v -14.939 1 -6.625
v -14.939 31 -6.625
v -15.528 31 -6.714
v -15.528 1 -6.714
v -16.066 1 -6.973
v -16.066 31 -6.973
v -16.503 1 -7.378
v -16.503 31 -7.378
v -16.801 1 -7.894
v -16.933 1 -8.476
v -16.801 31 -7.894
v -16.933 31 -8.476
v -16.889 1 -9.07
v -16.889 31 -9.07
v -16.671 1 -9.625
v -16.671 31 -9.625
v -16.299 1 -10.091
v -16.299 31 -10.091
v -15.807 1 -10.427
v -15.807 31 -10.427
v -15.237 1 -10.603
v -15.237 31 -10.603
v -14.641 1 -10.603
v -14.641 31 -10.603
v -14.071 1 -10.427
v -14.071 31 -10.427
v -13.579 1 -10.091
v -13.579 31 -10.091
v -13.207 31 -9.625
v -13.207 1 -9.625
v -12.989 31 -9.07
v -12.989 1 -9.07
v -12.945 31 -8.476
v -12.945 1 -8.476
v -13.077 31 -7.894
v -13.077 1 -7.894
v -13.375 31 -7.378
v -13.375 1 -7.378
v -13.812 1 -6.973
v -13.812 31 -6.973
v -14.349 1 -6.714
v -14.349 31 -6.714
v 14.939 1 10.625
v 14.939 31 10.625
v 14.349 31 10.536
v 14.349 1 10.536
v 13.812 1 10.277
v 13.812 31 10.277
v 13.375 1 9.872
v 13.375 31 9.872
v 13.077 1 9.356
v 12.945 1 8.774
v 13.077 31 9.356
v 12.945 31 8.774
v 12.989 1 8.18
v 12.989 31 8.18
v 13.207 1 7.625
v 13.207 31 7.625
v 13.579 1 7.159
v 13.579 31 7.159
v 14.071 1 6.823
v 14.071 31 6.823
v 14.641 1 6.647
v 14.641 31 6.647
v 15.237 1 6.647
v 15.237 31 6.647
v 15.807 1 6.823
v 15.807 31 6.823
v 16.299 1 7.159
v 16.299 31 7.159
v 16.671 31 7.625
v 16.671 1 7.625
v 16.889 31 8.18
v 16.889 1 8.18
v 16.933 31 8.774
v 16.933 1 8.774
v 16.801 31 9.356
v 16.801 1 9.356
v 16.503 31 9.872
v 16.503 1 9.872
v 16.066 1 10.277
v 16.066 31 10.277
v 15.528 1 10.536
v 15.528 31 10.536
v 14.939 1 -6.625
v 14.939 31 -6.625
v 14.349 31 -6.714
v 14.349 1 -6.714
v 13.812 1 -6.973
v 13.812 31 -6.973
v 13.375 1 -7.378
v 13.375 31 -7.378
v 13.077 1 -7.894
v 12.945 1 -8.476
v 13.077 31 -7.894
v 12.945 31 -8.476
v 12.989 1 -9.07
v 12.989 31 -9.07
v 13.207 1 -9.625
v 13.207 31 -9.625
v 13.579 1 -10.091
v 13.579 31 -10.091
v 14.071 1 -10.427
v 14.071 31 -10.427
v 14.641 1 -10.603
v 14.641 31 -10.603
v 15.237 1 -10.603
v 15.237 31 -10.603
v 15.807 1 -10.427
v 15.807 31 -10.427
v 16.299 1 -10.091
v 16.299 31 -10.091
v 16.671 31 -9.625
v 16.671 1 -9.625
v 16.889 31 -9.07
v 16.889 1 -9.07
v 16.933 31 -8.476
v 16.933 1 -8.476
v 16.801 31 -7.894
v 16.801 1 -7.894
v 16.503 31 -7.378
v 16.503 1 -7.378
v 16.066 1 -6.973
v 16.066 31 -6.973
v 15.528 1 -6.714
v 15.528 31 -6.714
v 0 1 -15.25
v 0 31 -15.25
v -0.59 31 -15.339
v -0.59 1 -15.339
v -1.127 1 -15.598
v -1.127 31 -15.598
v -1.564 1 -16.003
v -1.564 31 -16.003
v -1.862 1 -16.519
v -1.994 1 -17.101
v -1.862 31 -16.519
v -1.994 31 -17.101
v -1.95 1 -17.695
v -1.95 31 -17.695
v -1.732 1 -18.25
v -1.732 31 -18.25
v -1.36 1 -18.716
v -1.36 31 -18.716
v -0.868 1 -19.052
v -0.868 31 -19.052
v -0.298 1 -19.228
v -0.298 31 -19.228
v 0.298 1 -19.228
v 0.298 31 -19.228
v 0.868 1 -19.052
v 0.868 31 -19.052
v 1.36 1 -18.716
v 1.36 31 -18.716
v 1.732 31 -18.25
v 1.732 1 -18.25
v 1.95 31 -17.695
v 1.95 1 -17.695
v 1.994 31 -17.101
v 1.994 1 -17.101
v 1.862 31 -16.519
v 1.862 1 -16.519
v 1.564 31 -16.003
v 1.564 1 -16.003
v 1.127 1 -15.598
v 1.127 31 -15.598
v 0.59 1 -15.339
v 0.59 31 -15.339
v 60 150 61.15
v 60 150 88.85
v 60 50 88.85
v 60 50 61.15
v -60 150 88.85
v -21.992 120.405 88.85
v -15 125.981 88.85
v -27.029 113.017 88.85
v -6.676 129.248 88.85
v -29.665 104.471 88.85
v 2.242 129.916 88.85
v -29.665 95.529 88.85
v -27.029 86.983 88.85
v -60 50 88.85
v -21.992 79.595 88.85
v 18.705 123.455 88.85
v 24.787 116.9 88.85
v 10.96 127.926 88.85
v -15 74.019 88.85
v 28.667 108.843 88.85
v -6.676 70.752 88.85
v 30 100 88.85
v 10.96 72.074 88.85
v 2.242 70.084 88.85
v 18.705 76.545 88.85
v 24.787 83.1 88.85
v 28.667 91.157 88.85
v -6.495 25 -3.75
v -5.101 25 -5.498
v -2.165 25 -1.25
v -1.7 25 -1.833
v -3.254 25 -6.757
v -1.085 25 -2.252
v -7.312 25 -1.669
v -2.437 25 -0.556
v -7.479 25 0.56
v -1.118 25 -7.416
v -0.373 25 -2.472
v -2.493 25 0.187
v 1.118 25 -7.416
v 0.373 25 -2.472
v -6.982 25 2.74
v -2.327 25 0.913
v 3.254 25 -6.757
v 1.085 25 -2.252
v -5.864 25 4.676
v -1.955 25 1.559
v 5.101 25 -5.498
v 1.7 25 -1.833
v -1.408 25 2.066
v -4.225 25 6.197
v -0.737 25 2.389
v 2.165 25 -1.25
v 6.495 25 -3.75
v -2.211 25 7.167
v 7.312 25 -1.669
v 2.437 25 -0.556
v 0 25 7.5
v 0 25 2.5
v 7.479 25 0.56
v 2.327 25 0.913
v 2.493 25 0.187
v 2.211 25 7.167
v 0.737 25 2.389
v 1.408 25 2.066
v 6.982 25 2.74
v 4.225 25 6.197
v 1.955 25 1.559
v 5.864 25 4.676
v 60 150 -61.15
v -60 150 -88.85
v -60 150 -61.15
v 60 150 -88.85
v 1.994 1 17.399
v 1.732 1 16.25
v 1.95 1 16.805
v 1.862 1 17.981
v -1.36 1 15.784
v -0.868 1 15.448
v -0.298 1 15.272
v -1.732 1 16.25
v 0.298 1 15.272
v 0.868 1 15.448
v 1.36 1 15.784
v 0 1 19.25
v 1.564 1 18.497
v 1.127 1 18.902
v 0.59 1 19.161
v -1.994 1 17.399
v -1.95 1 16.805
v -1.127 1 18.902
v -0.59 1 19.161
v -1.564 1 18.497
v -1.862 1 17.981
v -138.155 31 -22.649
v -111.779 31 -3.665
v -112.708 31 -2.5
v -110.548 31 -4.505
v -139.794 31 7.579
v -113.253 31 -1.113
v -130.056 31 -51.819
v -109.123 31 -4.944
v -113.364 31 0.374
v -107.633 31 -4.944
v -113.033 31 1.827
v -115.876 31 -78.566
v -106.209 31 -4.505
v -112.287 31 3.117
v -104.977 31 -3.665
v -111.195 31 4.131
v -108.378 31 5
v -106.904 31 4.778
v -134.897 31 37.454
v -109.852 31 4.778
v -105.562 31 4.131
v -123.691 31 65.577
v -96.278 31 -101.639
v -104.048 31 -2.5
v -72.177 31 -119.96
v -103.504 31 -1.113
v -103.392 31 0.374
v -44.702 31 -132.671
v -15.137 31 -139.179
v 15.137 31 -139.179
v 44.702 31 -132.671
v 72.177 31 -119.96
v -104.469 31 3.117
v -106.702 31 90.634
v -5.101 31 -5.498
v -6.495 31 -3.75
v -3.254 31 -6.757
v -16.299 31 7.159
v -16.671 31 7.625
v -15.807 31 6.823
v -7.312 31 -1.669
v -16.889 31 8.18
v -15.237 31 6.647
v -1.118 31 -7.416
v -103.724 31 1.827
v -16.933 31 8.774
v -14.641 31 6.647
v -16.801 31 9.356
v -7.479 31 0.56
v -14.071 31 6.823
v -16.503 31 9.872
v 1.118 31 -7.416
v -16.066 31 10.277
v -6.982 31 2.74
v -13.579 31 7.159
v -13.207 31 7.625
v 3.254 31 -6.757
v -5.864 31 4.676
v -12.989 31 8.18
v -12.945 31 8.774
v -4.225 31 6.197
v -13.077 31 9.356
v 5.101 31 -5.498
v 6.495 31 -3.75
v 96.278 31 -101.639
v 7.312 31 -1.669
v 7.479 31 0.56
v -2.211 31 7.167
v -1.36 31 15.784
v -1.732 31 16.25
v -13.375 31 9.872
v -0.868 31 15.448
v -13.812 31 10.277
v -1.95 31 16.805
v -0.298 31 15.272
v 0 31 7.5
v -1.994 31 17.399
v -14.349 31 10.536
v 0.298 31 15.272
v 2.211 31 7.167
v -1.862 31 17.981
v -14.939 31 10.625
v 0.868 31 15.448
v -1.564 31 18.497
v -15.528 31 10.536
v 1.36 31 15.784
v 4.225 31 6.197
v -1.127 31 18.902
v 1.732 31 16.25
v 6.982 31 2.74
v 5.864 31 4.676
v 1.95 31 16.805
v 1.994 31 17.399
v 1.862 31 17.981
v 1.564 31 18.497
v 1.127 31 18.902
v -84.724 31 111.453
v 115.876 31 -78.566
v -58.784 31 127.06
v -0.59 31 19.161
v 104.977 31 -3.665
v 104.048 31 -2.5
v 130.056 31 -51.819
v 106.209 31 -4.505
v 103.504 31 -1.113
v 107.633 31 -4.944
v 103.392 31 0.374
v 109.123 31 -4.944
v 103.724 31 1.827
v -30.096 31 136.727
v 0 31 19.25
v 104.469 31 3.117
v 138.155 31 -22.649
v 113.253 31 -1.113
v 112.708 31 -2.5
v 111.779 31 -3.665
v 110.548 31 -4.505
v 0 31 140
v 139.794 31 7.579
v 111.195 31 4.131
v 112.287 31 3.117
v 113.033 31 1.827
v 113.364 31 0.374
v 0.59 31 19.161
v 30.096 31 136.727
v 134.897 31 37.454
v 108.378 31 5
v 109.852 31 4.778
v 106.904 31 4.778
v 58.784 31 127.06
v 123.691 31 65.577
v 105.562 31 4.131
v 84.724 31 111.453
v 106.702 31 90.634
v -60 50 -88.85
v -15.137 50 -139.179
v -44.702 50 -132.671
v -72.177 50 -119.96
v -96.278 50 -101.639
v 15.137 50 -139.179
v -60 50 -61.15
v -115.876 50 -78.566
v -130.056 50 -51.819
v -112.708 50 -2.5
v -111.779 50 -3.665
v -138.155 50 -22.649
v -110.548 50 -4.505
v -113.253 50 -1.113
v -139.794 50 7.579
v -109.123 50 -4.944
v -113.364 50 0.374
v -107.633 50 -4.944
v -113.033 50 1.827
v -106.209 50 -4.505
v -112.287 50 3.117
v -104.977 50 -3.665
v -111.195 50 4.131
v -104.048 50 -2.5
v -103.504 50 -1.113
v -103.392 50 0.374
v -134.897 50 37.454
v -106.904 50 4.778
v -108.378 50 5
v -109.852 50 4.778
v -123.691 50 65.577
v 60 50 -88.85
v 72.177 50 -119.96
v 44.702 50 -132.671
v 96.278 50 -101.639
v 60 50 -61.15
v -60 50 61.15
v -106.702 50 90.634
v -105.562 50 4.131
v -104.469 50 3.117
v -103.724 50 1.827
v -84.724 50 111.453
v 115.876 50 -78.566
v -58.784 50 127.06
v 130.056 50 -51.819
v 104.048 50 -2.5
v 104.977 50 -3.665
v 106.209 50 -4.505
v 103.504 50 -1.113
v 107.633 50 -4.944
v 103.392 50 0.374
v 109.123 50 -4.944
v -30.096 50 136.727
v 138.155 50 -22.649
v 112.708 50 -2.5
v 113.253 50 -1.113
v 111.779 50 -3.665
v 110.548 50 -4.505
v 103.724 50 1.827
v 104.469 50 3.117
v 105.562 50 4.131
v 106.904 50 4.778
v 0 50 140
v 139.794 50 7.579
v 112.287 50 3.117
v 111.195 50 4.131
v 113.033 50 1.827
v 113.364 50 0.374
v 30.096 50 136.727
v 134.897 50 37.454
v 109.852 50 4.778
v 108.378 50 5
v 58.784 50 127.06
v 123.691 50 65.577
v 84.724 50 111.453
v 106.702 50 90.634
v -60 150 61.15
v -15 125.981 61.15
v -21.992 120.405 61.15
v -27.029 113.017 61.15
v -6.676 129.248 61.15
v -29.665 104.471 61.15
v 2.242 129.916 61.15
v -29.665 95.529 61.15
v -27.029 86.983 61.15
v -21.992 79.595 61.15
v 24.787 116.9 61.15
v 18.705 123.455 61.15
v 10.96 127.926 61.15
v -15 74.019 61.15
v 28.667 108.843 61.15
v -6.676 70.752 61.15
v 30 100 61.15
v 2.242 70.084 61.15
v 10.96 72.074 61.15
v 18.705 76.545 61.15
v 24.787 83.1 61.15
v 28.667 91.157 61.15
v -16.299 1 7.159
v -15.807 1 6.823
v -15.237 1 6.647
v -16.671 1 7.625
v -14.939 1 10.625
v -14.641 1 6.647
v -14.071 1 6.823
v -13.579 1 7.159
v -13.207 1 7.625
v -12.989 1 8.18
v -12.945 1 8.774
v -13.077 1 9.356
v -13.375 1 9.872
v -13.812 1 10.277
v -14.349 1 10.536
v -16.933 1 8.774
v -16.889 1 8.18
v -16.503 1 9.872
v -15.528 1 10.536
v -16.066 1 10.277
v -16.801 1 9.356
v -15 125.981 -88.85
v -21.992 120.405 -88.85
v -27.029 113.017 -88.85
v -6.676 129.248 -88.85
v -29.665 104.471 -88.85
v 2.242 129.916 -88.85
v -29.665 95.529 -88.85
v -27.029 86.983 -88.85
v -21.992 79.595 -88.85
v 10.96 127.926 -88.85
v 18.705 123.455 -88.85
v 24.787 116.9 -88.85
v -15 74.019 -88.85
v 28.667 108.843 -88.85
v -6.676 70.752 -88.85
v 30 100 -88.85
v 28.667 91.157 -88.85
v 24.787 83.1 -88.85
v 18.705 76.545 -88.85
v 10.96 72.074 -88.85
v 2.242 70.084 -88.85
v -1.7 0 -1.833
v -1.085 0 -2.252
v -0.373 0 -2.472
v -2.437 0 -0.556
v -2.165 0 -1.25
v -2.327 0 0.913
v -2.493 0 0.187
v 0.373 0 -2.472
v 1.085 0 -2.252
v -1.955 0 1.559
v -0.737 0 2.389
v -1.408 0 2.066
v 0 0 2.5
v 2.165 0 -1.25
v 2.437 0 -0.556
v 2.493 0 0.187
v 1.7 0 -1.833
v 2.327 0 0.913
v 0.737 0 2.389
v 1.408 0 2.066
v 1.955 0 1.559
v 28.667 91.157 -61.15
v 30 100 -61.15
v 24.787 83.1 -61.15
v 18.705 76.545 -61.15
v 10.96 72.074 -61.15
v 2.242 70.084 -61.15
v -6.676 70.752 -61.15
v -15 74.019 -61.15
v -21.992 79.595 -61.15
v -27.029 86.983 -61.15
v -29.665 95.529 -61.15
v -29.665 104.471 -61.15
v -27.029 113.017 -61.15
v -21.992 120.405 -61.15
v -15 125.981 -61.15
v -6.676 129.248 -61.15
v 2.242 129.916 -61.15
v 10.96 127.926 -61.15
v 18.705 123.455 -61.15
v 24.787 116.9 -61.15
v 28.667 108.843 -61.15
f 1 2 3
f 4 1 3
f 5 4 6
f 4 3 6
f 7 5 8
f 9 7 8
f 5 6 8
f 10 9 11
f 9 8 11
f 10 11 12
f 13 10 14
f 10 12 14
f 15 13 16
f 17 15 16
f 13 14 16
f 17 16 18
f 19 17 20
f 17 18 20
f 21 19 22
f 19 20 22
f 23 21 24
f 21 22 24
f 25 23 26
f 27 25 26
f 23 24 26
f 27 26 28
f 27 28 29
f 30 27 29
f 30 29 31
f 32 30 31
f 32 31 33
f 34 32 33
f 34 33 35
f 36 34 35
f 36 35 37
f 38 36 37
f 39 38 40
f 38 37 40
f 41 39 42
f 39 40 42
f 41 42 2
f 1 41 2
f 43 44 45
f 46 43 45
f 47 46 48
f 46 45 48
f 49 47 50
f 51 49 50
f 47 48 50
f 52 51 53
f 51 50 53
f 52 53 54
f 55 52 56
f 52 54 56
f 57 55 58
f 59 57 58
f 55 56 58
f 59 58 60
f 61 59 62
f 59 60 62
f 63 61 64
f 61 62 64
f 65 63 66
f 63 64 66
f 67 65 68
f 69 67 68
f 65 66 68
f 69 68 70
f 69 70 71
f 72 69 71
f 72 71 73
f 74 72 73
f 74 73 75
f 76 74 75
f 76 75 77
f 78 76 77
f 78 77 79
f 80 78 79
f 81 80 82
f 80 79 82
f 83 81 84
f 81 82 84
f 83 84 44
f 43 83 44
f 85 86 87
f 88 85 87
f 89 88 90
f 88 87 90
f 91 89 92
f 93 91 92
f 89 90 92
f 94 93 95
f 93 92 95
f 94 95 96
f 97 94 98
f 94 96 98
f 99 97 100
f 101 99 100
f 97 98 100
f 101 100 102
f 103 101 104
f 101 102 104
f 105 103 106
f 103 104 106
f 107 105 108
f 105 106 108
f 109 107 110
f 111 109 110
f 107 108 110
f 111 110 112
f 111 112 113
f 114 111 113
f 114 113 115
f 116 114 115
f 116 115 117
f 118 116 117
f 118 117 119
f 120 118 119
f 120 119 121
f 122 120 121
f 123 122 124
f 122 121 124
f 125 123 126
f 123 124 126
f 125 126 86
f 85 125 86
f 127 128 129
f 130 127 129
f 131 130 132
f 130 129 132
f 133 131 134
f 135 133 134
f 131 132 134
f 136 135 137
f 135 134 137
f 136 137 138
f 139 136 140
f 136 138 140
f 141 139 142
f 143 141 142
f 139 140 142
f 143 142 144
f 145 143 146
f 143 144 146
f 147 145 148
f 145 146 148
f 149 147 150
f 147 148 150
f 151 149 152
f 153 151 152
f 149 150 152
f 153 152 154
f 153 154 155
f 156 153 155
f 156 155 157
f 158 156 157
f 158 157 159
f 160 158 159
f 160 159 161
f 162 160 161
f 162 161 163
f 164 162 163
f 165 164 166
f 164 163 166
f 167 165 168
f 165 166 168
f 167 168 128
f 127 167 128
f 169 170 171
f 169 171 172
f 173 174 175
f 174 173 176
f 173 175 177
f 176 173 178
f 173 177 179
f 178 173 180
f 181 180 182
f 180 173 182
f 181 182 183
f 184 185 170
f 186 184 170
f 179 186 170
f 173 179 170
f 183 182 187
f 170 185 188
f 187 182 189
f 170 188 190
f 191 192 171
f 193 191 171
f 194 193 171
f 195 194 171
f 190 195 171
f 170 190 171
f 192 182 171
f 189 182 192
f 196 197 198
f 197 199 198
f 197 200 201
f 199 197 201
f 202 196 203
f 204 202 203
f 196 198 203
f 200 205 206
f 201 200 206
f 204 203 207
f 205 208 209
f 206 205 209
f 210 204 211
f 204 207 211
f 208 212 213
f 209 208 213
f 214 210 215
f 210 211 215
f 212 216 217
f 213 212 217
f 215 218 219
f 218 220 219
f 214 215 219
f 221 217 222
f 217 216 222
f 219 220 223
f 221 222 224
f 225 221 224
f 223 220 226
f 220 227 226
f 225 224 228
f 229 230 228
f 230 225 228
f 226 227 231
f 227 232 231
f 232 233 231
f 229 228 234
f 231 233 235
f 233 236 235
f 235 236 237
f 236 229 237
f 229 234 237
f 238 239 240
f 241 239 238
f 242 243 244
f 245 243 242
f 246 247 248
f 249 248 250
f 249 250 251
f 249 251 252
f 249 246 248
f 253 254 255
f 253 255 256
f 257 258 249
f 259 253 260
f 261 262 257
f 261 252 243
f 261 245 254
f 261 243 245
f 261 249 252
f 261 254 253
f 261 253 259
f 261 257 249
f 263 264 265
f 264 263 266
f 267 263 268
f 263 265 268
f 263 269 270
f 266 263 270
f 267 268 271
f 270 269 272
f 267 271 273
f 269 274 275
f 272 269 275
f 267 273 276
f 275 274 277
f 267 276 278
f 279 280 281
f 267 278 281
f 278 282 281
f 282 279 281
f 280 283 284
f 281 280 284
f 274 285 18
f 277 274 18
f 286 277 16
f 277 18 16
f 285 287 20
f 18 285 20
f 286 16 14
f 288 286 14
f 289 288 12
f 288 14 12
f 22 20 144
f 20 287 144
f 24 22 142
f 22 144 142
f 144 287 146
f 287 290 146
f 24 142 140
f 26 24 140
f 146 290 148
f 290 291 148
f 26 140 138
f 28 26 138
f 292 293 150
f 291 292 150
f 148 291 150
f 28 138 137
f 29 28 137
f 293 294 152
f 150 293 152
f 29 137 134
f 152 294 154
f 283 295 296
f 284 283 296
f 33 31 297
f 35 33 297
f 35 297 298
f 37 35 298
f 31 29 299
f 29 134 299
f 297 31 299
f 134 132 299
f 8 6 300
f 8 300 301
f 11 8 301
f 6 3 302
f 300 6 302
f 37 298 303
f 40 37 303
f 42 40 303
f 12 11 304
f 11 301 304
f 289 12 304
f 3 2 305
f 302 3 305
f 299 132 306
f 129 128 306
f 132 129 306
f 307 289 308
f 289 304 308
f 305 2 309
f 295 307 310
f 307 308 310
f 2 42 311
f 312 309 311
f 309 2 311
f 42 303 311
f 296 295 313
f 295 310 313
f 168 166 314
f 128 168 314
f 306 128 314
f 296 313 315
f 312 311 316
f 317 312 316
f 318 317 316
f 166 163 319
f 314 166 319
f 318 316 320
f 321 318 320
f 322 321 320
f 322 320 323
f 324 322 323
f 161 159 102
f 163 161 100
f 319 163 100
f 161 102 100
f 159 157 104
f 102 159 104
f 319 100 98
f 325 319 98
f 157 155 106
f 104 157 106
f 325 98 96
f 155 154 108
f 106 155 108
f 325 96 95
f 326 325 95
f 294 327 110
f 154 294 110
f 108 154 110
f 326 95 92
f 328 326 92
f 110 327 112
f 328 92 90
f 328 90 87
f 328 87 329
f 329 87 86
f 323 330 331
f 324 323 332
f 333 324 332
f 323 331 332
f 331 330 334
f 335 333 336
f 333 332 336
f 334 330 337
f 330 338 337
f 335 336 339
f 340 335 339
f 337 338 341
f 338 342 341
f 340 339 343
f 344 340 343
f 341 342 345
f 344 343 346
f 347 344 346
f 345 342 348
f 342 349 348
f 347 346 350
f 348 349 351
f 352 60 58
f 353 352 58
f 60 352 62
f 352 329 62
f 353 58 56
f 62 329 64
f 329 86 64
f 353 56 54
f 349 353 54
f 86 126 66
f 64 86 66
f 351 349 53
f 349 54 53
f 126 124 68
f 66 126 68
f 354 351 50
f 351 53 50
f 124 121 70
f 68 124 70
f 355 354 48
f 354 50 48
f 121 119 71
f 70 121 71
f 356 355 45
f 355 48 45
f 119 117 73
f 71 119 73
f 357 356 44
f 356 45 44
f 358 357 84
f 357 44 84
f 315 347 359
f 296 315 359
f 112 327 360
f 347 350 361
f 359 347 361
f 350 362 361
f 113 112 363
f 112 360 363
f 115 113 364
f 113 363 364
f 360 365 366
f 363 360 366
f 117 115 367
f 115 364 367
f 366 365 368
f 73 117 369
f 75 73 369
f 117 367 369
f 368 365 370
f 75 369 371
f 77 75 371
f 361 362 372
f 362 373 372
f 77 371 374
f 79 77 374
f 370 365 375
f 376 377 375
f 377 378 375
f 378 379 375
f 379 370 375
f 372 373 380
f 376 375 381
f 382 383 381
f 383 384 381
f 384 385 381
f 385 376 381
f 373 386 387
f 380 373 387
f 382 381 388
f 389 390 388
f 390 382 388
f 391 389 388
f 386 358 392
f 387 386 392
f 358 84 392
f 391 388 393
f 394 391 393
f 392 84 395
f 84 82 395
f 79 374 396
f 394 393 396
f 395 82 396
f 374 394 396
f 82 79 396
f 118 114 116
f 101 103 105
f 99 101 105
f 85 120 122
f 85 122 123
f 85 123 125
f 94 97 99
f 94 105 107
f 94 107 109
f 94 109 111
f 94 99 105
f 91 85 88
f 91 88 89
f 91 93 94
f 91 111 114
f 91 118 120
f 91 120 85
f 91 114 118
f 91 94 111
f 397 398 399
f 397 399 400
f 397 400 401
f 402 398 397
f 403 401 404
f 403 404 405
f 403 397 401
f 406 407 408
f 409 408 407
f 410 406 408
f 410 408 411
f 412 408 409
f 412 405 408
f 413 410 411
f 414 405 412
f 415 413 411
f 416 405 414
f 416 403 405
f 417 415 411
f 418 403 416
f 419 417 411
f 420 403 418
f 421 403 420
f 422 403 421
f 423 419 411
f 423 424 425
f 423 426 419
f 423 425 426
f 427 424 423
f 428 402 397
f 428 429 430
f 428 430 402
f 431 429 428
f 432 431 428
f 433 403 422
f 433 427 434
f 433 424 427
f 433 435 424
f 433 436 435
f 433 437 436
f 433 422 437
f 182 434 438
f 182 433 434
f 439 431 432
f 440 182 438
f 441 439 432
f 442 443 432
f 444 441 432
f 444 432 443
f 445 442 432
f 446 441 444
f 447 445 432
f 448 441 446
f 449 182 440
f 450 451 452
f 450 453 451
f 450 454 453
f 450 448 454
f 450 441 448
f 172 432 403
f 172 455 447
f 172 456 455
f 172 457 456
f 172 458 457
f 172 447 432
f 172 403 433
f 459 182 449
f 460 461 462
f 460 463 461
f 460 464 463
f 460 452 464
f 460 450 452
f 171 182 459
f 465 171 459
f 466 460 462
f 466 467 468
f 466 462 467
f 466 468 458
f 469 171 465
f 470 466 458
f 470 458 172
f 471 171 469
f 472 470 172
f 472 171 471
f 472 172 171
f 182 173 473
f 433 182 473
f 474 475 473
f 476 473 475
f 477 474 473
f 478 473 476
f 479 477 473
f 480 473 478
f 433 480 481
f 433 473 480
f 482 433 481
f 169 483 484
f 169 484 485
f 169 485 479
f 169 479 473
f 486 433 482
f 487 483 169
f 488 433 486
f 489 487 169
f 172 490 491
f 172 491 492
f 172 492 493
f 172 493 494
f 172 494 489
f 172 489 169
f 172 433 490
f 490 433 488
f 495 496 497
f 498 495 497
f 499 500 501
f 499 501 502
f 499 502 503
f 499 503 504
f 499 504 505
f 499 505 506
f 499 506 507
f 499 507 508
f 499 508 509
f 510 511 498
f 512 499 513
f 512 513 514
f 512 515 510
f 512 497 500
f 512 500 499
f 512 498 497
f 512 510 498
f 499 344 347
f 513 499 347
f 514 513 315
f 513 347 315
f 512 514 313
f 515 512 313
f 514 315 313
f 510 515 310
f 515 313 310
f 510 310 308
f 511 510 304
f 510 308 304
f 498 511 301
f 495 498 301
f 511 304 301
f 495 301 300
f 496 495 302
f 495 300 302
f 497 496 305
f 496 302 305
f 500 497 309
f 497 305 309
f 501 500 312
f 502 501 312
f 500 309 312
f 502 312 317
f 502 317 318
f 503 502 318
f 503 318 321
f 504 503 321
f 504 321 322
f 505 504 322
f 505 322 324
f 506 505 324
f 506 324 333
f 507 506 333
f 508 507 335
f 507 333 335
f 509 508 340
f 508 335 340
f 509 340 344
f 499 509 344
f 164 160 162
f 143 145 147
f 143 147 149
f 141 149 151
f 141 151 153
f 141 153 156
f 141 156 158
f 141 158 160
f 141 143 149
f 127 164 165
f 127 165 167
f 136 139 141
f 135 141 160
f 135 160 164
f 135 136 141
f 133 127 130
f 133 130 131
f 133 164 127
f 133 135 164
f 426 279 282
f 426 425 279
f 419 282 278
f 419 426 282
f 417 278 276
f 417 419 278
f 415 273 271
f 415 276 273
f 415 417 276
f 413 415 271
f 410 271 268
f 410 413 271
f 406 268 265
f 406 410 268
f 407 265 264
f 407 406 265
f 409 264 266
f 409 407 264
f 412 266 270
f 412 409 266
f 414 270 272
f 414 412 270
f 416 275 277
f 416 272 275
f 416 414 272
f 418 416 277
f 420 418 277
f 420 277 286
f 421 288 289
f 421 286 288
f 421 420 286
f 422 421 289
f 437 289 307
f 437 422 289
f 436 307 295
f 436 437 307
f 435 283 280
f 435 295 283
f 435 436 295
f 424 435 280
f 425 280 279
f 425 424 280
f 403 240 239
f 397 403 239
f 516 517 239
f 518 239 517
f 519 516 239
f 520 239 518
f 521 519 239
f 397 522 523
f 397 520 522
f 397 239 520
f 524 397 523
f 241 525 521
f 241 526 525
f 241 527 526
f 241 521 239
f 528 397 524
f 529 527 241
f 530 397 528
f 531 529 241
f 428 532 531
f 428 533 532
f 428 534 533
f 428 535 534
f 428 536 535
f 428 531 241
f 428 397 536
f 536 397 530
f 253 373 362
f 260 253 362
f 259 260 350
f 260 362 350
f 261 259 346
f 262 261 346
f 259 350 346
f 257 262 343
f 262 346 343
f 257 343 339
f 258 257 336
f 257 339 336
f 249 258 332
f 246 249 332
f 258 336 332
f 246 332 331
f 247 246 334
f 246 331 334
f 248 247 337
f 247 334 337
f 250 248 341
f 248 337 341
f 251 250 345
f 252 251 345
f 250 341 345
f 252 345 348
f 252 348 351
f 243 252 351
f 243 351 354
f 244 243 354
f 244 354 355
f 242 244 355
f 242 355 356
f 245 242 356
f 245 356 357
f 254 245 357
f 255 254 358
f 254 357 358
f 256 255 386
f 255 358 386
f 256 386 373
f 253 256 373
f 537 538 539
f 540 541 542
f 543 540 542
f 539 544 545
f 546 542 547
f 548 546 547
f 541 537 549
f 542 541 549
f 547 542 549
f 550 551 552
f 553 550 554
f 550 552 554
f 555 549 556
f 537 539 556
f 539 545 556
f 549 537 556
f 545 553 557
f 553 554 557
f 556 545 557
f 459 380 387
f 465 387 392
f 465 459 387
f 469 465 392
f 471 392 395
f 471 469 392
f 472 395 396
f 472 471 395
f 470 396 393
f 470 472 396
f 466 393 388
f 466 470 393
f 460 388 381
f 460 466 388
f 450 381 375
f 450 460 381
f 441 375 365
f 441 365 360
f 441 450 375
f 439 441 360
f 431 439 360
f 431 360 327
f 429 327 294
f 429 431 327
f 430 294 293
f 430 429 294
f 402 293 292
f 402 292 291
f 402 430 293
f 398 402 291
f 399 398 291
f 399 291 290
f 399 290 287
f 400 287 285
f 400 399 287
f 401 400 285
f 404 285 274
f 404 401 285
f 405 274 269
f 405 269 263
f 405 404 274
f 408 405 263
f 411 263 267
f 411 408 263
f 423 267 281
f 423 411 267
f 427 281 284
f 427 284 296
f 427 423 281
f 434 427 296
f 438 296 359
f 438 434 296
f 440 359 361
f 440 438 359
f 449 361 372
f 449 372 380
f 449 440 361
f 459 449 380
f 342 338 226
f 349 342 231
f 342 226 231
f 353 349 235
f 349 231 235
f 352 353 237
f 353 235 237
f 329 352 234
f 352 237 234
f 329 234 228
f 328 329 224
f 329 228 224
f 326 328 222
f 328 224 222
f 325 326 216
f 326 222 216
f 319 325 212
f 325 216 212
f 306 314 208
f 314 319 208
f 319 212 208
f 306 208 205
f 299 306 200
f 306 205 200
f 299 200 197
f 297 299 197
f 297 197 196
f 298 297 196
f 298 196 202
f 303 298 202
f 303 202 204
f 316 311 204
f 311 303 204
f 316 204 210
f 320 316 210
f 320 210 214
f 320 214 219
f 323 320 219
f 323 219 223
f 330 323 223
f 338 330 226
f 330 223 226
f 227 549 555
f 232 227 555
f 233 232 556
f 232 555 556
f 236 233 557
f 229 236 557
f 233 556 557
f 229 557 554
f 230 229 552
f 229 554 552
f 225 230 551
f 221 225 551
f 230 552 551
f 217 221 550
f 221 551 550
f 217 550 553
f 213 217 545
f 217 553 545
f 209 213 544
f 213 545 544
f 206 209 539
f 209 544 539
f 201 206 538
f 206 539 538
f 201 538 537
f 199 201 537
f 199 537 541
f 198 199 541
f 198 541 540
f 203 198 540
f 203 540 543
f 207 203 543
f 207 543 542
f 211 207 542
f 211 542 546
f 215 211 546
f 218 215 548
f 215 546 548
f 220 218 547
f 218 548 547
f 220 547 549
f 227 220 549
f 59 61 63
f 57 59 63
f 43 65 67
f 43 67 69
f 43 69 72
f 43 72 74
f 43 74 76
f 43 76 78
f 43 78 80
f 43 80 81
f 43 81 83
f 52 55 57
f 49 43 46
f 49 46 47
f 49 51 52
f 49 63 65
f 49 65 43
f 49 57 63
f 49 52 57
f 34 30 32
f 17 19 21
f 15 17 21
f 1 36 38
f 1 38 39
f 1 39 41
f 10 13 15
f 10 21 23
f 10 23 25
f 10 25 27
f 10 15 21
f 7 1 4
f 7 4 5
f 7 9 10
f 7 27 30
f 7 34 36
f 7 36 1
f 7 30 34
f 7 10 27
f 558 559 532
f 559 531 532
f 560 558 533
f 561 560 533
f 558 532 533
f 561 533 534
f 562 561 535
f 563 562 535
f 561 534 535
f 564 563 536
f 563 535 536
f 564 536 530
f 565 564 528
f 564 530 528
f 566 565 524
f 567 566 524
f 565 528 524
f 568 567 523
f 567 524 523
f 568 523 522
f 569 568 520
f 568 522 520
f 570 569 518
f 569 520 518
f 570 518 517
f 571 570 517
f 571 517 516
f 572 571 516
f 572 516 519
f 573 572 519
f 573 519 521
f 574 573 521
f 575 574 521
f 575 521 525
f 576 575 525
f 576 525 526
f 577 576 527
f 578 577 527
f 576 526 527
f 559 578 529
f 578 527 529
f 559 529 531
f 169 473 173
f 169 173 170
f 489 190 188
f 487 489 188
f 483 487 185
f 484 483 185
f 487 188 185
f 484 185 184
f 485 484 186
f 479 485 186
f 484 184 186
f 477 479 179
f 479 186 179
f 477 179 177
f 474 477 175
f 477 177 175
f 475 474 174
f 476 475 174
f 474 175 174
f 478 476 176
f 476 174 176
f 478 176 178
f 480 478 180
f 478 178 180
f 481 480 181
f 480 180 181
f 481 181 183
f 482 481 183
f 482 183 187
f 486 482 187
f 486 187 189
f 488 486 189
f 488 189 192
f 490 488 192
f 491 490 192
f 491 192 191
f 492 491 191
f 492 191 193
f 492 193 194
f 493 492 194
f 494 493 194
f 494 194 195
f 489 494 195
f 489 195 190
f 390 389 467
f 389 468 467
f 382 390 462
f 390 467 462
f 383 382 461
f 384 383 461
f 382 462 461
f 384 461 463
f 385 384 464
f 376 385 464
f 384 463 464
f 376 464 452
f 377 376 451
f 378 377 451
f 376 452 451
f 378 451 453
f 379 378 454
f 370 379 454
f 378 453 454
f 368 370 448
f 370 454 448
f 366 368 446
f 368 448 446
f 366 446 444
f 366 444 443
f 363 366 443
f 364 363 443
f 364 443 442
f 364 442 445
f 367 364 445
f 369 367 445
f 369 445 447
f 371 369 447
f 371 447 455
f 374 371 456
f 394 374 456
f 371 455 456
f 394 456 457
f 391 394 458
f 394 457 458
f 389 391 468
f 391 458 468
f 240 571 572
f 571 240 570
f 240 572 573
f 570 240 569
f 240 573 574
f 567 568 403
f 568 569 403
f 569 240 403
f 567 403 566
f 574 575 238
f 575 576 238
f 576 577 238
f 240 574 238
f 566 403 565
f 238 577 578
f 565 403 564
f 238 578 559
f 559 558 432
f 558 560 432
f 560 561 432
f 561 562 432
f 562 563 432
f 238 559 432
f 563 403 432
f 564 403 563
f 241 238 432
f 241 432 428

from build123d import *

# Parameters (mm, degrees)
SKETCH_4_R          = 2.5
EXTRUDE_3_DEPTH     = 25
SKETCH_5_R          = 7.5
EXTRUDE_4_DEPTH     = 25
SKETCH_6_R          = 139.999706489
EXTRUDE_5_DEPTH     = 19
SKETCH_15_W         = 120
SKETCH_15_H         = 27.7
EXTRUDE_7_DEPTH     = 100
CUT_EXTRUDE_3_REACH = 309.363
SKETCH_16_R         = 30
CUT_EXTRUDE_4_REACH = 309.363
SKETCH_17_R         = 30
SKETCH_18_R         = 2
EXTRUDE_8_DEPTH     = 30
SKETCH_19_R         = 5
CUT_EXTRUDE_5_DEPTH = 222.810359618


with BuildPart() as part:
    # 草图4 → 凸台-拉伸3 (new body)
    with BuildSketch(Plane(origin=(0, 0, 0), x_dir=(1, 0, 0), z_dir=(0, 1, 0))):
        with Locations(Location((0, 0, 0), (0, 0, 270))):
            Circle(SKETCH_4_R)
    extrude(amount=EXTRUDE_3_DEPTH)

    # 草图5 → 凸台-拉伸4 (add)
    with BuildSketch(Plane(origin=(0, 25, 0), x_dir=(1, 0, 0), z_dir=(0, 1, 0))):
        with Locations(Location((0, 0, 0), (0, 0, 270))):
            Circle(SKETCH_5_R)
    extrude(amount=EXTRUDE_4_DEPTH)

    # 草图6 → 凸台-拉伸5 (add)
    with BuildSketch(Plane(origin=(0, 50, 0), x_dir=(1, 0, 0), z_dir=(0, 1, 0))):
        with Locations(Location((0, 0, 0), (0, 0, 270))):
            Circle(SKETCH_6_R)
    extrude(amount=-EXTRUDE_5_DEPTH)

    # 草图15 → 凸台-拉伸7 (add)
    with BuildSketch(Plane(origin=(0, 50, 0), x_dir=(1, 0, 0), z_dir=(0, 1, 0))):
        with Locations((0, 75)):
            Rectangle(SKETCH_15_W, SKETCH_15_H)
        with Locations((0, -75)):
            Rectangle(SKETCH_15_W, SKETCH_15_H)
    extrude(amount=EXTRUDE_7_DEPTH)

    # 草图16 → 切除-拉伸3 (cut, up to next)
    with BuildSketch(Plane.XY.offset(88.85), mode=Mode.PRIVATE) as cut_extrude_3_sk1:
        with Locations((0, 100)):
            Circle(SKETCH_16_R)
    cut_extrude_3_tool1 = extrude(cut_extrude_3_sk1.sketch, amount=-CUT_EXTRUDE_3_REACH, mode=Mode.PRIVATE) & part.part
    add(cut_extrude_3_tool1.solids().sort_by_distance((0, 100, 88.85))[0], mode=Mode.SUBTRACT)

    # 草图17 → 切除-拉伸4 (cut, up to next)
    with BuildSketch(Plane(origin=(0, 0, -88.85), x_dir=(-1, 0, 0), z_dir=(0, 0, -1)), mode=Mode.PRIVATE) as cut_extrude_4_sk1:
        with Locations(Location((0, 100, 0), (0, 0, 180))):
            Circle(SKETCH_17_R)
    cut_extrude_4_tool1 = extrude(cut_extrude_4_sk1.sketch, amount=-CUT_EXTRUDE_4_REACH, mode=Mode.PRIVATE) & part.part
    add(cut_extrude_4_tool1.solids().sort_by_distance((0, 100, -88.85))[0], mode=Mode.SUBTRACT)

    # 草图18 → 凸台-拉伸8 (add)
    with BuildSketch(Plane.XZ.offset(-31)):
        with Locations(Location((0, 17.25, 0), (0, 0, 90))):
            Circle(SKETCH_18_R)
        with Locations(Location((14.938938215, 8.625, 0), (0, 0, 90))):
            Circle(SKETCH_18_R)
        with Locations(Location((14.938938215, -8.625, 0), (0, 0, 90))):
            Circle(SKETCH_18_R)
        with Locations(Location((0, -17.25, 0), (0, 0, 90))):
            Circle(SKETCH_18_R)
        with Locations(Location((-14.938938215, -8.625, 0), (0, 0, 90))):
            Circle(SKETCH_18_R)
        with Locations(Location((-14.938938215, 8.625, 0), (0, 0, 90))):
            Circle(SKETCH_18_R)
    extrude(amount=EXTRUDE_8_DEPTH)

    # 草图19 → 切除-拉伸5 (cut, symmetric)
    with BuildSketch(Plane(origin=(0, 50, 0), x_dir=(1, 0, 0), z_dir=(0, 1, 0))):
        with Locations(Location((108.378245134, 0, 0), (0, 0, 270))):
            Circle(SKETCH_19_R)
    cut_extrude_5 = extrude(amount=CUT_EXTRUDE_5_DEPTH, both=True, mode=Mode.SUBTRACT)

    # 镜向1: 切除-拉伸5 across plane
    add(cut_extrude_5.mirror(Plane(origin=(0, 0, 0), x_dir=(0, 0, 1), z_dir=(1, 0, 0))), mode=Mode.SUBTRACT)


solid = part.part
